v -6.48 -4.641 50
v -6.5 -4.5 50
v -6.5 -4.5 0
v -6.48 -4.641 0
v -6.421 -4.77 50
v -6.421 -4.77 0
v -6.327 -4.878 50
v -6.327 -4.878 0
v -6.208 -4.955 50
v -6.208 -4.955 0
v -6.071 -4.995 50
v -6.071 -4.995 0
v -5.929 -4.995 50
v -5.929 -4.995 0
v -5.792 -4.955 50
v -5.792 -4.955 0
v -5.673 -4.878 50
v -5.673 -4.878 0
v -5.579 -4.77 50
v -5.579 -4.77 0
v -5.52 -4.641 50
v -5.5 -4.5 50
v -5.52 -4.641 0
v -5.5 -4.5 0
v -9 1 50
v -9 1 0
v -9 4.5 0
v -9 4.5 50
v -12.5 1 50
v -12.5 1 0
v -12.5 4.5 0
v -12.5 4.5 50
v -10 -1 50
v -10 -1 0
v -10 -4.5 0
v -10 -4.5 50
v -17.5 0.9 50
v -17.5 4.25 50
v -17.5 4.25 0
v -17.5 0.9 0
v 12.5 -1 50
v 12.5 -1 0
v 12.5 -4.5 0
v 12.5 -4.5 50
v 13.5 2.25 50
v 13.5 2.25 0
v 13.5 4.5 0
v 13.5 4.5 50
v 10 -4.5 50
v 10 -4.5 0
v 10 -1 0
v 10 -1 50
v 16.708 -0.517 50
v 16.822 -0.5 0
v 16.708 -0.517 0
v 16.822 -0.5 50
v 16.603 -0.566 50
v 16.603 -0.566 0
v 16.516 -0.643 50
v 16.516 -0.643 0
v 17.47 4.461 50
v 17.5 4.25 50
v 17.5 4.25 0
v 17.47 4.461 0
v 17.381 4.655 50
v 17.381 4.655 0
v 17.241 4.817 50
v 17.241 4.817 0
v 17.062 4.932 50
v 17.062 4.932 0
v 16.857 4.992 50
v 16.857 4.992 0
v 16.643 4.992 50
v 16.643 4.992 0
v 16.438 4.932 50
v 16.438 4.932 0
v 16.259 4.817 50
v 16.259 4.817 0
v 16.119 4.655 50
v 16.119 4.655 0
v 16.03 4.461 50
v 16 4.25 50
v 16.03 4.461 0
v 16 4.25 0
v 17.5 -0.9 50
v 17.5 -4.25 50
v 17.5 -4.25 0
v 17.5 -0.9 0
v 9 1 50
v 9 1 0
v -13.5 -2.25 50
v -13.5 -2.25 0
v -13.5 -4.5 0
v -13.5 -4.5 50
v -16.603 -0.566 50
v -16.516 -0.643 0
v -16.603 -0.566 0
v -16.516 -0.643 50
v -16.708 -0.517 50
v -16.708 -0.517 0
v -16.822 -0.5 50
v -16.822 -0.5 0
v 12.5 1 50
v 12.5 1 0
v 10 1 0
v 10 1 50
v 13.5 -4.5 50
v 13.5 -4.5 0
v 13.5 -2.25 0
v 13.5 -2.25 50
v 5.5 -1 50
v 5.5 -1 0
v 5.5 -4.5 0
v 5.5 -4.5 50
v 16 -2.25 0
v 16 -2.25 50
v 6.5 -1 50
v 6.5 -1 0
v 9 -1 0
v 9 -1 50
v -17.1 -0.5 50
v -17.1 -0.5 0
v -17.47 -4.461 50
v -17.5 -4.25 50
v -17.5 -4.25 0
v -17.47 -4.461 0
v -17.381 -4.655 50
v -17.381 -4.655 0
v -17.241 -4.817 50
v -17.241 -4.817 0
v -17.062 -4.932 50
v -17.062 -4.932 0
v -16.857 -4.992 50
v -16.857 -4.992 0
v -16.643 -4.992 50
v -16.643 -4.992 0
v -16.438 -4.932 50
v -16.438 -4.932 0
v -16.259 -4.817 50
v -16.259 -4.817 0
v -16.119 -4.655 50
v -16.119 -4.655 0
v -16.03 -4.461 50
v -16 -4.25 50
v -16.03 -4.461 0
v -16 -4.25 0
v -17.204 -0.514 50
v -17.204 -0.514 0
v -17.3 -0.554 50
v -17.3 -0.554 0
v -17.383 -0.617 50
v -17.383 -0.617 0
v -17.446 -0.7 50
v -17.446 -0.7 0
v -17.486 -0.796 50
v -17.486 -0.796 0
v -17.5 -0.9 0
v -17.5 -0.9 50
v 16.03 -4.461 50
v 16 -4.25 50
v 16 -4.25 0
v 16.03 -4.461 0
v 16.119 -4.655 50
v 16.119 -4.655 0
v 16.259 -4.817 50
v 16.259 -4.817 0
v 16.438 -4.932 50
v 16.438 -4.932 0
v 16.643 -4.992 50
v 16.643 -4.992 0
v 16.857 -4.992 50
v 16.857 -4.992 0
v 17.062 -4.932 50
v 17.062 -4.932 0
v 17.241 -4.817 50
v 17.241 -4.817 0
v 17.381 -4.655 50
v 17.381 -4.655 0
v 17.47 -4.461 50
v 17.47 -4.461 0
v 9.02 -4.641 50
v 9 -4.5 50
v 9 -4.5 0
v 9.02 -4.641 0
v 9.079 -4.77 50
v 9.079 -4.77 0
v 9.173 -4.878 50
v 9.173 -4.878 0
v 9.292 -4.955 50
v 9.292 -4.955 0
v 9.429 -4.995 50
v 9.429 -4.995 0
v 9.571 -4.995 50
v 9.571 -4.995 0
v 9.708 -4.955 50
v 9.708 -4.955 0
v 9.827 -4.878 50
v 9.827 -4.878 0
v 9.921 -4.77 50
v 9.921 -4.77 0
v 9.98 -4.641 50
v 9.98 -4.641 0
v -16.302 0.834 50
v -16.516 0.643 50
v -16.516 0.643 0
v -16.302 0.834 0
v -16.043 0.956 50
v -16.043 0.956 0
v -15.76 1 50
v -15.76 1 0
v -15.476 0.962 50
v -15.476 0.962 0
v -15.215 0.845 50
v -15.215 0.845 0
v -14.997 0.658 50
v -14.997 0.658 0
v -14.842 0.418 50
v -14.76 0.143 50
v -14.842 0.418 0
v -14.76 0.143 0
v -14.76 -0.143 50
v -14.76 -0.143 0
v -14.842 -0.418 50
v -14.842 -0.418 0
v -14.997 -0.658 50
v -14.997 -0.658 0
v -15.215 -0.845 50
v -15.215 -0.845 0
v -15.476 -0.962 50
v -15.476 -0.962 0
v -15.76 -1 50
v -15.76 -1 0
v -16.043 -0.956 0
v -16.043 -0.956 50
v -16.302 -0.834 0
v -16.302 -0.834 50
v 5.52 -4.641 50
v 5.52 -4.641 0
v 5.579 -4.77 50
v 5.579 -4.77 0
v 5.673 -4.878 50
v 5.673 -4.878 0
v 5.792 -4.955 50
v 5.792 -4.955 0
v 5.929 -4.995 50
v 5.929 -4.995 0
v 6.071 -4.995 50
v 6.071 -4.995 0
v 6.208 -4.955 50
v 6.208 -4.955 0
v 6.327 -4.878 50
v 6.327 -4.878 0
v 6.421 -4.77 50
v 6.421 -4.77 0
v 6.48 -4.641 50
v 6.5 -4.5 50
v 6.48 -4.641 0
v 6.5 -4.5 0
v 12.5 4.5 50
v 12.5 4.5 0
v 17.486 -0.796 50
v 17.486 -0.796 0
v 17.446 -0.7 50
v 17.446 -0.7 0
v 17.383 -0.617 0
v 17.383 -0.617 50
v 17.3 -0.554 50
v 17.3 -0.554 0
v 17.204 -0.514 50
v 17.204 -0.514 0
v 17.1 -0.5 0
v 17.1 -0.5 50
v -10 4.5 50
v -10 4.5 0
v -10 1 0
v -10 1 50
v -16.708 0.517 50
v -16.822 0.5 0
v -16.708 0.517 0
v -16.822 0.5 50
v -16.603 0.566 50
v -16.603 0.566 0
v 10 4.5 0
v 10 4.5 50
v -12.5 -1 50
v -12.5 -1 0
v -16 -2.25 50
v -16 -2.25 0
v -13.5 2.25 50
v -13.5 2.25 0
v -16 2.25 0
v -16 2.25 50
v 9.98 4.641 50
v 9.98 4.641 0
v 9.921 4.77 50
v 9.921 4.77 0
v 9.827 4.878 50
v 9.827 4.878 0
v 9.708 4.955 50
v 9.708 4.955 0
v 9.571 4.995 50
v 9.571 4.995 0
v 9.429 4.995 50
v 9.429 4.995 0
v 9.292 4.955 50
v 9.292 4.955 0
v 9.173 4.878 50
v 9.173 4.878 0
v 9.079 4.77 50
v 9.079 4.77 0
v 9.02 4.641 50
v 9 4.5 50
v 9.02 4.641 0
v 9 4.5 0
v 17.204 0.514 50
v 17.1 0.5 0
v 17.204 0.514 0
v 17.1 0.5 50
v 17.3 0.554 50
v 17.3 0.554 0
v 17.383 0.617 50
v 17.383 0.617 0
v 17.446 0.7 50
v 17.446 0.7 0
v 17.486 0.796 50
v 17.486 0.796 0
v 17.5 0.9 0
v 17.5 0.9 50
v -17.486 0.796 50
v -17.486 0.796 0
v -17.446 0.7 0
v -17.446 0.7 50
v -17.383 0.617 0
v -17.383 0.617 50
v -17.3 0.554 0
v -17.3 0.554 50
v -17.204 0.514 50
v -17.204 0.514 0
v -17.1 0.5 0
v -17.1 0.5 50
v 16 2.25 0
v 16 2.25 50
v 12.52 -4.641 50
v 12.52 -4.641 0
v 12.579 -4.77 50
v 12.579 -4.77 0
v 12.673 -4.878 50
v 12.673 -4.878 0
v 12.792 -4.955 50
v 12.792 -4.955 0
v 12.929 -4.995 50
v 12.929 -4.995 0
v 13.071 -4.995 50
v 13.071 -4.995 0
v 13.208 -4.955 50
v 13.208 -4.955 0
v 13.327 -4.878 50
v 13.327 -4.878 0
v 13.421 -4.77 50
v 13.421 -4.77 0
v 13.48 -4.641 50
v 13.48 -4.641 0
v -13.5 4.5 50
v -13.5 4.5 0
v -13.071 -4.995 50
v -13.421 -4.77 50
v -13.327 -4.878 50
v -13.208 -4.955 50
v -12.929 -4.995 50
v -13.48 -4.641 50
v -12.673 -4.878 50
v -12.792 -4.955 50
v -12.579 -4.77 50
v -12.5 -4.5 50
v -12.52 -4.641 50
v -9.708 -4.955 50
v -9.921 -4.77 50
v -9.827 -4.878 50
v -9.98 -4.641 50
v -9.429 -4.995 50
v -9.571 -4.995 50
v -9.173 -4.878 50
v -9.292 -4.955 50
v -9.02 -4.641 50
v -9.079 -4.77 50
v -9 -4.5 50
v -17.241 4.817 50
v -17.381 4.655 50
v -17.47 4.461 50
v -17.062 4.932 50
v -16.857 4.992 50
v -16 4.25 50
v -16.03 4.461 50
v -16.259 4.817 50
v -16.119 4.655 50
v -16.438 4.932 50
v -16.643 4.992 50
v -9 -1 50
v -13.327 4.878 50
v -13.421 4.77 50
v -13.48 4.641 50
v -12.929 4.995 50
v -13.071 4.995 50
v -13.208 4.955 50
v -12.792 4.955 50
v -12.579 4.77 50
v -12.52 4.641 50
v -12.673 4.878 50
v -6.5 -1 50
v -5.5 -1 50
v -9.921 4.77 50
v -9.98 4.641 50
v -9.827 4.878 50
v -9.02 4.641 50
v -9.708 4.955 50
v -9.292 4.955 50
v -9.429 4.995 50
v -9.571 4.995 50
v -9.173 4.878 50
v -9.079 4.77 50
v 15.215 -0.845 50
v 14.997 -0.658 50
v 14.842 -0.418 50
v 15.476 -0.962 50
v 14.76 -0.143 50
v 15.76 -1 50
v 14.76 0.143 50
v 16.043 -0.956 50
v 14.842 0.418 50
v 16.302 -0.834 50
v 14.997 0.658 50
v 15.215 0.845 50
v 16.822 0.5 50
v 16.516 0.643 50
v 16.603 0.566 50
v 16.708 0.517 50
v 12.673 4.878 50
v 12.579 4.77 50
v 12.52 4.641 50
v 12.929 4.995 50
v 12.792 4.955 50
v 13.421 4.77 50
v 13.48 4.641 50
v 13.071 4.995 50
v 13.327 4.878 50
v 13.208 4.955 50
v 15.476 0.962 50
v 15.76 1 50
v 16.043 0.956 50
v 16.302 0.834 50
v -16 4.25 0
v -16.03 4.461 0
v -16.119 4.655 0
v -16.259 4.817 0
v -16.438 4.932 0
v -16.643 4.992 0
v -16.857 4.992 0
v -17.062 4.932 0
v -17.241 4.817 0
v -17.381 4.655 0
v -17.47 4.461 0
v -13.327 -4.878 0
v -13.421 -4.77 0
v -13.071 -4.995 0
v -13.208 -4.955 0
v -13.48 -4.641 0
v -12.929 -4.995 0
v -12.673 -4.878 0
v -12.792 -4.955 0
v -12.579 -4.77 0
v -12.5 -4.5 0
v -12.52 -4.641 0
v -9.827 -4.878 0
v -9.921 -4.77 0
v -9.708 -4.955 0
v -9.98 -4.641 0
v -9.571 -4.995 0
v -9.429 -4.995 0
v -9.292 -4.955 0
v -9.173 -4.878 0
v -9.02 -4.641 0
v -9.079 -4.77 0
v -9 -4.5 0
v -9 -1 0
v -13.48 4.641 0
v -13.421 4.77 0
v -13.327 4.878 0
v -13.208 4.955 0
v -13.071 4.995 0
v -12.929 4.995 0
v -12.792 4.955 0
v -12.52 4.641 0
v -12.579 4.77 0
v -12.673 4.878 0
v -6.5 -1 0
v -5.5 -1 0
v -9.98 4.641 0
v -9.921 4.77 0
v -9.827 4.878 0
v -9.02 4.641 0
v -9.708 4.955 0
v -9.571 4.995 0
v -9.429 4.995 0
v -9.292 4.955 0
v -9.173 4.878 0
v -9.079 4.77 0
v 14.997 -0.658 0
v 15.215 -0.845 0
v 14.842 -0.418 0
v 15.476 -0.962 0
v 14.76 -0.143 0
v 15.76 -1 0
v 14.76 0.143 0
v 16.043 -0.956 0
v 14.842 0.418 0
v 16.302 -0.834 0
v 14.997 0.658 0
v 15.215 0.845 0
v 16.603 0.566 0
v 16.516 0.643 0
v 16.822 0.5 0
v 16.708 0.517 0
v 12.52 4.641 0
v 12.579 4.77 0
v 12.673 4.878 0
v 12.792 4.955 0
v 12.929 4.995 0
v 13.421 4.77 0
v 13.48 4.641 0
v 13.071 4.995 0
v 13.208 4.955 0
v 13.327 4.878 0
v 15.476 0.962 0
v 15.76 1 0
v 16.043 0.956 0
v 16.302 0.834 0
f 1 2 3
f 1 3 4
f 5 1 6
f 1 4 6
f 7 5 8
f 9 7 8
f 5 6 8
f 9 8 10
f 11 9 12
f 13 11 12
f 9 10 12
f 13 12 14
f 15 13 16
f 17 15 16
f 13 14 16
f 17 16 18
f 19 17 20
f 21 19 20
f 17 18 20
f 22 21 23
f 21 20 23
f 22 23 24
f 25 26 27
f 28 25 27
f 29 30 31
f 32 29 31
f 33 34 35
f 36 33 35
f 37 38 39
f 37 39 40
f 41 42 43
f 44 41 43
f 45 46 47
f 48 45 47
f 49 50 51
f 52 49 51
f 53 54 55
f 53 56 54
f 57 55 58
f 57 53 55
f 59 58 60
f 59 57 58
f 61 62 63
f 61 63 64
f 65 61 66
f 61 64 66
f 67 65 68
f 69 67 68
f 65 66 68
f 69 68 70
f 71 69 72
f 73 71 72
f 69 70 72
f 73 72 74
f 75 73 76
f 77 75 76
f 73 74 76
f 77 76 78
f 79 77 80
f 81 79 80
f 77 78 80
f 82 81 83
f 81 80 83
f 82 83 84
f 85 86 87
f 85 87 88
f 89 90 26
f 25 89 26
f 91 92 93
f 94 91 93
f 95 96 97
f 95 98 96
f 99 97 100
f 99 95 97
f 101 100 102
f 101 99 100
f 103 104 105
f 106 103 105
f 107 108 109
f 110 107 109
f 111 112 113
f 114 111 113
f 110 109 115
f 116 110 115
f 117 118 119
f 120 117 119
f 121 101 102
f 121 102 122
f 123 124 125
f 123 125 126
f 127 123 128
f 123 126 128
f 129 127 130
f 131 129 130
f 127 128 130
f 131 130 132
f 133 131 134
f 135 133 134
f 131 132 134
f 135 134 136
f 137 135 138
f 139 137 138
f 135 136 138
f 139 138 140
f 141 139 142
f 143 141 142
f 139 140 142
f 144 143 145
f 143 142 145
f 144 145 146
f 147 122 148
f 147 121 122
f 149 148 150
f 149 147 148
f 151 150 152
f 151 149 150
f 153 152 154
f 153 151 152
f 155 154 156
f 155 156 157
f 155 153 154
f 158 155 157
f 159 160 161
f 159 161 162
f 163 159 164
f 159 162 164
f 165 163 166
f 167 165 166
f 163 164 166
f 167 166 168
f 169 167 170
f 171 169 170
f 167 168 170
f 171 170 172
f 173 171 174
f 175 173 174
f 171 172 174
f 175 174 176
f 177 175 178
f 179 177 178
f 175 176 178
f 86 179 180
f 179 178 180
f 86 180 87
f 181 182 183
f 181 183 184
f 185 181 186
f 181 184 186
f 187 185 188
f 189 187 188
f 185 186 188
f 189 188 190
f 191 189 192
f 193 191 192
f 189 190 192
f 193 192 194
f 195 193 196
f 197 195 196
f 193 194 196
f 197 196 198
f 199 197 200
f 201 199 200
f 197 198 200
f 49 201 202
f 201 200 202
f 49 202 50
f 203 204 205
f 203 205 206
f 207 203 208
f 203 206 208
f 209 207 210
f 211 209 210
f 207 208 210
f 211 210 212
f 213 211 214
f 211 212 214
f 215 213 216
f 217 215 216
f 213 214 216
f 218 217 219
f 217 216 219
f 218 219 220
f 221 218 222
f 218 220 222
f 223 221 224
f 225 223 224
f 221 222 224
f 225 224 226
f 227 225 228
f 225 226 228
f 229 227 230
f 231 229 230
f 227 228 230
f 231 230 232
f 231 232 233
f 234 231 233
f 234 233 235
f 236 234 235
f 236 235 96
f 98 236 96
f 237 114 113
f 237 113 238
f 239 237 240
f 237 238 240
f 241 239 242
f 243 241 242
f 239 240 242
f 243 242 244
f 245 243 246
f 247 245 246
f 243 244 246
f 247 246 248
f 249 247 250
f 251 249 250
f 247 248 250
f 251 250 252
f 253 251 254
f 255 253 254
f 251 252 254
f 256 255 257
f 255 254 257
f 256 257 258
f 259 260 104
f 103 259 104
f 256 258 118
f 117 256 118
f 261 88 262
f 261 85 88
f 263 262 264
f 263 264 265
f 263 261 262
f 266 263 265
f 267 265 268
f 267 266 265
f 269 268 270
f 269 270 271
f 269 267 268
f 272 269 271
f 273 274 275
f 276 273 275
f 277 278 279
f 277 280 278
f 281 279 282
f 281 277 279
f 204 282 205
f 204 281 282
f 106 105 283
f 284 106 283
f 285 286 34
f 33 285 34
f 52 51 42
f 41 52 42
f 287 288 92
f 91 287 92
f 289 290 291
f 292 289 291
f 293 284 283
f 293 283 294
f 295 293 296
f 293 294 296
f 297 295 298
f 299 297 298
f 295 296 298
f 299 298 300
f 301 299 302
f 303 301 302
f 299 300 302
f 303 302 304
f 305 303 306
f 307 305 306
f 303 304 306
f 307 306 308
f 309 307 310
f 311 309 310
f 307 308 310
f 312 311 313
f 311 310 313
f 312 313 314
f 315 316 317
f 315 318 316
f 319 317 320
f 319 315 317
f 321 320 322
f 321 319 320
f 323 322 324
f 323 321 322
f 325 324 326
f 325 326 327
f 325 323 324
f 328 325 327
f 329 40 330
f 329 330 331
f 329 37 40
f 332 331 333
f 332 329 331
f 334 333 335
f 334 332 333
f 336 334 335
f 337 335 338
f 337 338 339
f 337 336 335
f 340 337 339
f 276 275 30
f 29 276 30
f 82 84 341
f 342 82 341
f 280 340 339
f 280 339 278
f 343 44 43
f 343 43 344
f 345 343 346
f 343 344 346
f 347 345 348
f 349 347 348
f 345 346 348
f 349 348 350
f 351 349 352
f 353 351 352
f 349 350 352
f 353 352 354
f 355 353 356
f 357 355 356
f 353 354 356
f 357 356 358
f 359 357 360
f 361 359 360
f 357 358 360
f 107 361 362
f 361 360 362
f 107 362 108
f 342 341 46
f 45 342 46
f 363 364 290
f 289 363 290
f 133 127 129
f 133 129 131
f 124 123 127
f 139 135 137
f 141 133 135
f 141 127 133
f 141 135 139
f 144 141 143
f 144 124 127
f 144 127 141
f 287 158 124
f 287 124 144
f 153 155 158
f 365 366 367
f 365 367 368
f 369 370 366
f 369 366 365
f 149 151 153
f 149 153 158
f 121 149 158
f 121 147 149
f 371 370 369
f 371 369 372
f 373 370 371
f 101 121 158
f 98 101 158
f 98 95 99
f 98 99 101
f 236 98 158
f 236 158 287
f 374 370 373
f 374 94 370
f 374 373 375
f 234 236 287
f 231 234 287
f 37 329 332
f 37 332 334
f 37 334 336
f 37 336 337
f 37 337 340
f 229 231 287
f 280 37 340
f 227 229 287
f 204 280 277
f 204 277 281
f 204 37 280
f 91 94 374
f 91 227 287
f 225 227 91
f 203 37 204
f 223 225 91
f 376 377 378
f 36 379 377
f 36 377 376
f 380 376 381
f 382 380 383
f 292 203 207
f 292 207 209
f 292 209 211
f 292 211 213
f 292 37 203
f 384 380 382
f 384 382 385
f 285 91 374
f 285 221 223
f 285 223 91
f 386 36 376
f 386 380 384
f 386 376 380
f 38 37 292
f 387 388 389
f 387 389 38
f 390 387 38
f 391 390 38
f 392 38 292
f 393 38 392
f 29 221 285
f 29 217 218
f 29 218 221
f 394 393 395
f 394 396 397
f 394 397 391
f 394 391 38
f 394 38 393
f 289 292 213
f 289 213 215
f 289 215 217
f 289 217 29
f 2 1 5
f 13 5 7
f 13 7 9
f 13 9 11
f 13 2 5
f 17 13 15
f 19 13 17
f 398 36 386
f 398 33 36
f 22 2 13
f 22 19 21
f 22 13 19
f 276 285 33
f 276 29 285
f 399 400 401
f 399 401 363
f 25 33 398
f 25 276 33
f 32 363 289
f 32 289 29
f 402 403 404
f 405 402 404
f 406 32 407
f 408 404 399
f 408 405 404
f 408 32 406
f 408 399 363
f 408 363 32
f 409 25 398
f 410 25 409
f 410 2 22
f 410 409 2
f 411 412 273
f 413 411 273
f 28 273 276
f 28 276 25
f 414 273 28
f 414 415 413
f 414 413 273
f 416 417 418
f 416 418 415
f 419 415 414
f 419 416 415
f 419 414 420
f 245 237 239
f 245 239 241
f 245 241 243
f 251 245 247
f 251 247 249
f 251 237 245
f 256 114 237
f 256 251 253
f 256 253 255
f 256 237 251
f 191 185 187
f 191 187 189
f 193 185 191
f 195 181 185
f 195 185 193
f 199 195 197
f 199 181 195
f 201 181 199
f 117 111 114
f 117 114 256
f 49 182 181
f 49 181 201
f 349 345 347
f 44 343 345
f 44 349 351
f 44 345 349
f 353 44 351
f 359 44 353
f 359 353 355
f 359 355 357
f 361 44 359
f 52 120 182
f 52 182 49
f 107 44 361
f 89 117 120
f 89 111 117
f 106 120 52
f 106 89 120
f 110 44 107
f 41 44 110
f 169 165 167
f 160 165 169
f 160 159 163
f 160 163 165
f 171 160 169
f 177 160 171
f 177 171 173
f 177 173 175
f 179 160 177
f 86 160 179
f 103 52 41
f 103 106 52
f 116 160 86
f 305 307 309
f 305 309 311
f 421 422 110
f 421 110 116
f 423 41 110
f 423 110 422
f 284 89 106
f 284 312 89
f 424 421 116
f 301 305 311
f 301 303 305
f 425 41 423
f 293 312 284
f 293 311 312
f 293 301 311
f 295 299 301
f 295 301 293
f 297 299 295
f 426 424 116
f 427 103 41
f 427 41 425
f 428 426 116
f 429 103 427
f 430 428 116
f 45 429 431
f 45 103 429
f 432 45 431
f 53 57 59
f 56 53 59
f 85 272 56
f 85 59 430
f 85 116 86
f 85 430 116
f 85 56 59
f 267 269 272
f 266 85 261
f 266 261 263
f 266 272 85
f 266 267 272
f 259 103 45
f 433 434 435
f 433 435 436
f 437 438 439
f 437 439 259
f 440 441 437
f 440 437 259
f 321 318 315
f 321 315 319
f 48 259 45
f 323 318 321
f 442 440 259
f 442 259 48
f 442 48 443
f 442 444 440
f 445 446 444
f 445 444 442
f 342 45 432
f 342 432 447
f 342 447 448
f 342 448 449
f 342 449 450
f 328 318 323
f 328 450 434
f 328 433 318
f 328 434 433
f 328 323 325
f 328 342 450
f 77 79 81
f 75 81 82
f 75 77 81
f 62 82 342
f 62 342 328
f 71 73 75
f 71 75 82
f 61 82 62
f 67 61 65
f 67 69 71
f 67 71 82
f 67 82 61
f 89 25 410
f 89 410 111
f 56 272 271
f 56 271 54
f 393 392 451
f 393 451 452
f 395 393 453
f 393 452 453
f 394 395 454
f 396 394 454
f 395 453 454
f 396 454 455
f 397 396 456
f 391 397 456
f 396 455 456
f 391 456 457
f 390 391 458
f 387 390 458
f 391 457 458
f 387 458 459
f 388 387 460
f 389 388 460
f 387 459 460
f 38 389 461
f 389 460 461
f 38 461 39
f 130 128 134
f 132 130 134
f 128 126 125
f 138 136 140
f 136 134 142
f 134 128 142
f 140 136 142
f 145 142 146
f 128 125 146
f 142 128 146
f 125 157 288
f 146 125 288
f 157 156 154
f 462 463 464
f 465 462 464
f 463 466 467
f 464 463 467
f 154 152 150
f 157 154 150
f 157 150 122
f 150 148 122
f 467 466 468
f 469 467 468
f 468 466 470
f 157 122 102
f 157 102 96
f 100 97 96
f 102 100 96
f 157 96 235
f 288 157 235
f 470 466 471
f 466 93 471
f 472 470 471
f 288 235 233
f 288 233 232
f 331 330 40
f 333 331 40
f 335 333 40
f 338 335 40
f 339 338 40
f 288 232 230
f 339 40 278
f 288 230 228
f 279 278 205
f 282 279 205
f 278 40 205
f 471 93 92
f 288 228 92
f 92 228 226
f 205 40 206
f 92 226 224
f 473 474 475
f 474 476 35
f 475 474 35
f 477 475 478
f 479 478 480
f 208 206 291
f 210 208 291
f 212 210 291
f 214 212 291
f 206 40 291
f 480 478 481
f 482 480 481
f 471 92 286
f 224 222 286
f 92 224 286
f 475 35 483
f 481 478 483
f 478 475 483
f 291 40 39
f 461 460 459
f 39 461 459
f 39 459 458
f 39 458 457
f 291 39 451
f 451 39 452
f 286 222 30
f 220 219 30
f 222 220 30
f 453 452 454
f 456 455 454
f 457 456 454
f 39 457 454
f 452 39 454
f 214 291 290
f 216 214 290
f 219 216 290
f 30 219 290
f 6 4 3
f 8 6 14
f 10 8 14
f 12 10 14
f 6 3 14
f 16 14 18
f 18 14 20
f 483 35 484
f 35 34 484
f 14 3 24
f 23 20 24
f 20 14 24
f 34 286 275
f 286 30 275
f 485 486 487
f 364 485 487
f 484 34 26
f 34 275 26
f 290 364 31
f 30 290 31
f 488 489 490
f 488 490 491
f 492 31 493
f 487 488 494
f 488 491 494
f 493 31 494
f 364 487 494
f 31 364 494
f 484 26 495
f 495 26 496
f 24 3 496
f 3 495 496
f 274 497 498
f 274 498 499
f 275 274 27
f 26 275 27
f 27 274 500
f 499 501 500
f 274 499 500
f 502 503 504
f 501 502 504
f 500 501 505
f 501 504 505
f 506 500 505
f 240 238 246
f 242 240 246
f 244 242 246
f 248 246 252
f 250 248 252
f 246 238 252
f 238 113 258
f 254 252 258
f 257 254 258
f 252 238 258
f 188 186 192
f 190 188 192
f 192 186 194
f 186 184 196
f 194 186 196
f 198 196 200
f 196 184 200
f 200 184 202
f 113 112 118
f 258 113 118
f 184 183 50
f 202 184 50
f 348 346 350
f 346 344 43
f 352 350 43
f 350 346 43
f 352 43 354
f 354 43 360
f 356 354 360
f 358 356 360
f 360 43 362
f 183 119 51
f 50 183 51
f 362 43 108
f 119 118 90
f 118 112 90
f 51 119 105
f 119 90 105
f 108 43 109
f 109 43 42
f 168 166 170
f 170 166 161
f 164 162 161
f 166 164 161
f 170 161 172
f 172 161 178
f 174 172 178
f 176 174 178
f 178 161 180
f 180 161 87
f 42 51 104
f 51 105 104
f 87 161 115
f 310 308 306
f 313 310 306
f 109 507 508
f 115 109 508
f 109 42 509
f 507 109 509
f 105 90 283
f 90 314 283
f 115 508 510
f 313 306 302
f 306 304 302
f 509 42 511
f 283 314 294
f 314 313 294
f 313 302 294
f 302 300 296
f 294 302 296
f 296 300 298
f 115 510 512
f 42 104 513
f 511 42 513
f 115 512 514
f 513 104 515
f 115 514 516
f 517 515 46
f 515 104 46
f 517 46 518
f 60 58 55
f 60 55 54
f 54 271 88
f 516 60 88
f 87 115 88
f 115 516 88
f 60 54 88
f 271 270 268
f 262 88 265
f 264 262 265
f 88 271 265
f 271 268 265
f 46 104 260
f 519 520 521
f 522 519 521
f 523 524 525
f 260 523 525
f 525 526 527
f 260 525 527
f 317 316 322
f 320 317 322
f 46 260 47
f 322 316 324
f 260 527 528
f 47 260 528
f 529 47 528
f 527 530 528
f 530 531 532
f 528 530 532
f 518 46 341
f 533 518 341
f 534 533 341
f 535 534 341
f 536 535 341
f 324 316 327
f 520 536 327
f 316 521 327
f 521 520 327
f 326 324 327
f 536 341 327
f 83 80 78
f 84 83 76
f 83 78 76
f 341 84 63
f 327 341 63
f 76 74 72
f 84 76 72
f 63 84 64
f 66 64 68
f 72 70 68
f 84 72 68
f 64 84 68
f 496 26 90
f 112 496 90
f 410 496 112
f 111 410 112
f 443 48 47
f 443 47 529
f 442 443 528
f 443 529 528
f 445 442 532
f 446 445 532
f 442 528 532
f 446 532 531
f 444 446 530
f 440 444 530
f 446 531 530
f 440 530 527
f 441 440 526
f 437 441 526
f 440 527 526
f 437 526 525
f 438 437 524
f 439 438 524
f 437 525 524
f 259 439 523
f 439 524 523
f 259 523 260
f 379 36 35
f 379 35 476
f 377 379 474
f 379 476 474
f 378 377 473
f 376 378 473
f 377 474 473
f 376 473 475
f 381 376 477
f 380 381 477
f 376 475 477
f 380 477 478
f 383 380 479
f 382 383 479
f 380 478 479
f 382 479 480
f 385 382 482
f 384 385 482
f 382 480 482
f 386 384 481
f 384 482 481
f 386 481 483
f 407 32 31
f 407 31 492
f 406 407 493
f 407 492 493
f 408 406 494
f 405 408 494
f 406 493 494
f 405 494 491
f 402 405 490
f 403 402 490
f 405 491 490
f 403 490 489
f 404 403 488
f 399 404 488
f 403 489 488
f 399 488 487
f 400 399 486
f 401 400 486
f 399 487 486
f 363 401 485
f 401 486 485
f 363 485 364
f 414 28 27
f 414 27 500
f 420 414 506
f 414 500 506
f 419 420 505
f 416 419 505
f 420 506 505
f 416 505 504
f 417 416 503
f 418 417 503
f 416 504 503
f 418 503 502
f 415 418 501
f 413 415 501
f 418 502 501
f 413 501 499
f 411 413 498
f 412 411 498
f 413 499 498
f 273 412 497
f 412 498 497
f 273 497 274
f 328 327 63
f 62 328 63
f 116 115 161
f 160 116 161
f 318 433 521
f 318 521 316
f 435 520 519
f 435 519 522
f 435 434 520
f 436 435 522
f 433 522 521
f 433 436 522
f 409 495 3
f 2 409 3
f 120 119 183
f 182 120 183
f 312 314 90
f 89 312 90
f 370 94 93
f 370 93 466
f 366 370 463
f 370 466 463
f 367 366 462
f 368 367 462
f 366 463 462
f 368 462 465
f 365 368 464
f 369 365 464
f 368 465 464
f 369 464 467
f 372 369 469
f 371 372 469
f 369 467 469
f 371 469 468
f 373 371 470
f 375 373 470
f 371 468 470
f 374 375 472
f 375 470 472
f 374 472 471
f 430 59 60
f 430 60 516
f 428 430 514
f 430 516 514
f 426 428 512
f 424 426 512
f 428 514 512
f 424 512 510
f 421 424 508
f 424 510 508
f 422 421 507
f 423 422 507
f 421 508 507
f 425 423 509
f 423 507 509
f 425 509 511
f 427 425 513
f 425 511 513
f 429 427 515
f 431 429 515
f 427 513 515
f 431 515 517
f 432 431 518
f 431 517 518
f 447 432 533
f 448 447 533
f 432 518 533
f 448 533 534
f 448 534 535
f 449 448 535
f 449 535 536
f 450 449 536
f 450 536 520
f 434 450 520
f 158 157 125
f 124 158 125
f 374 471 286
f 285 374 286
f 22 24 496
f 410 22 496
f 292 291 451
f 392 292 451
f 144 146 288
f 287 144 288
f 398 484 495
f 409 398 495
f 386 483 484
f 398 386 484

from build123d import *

# Parameters (mm, degrees)
EXTRUDE_1_DEPTH = 50
FILLET_1_R      = 0.4


with BuildPart() as part:
    # Эскиз1 → Бобышка-Вытянуть1 (new body)
    with BuildSketch(Plane.XY):
        with BuildLine():
            Line((17.5, -4.25), (17.5, -0.5))
            Line((17.5, -0.5), (16.616025404, -0.5))
            ThreePointArc((16.616025404, -0.5), (14.75, 0), (16.616025404, 0.5))
            Line((16.616025404, 0.5), (17.5, 0.5))
            Line((17.5, 0.5), (17.5, 4.25))
            ThreePointArc((17.5, 4.25), (16.75, 5), (16, 4.25))
            Line((16, 4.25), (16, 2.25))
            Line((16, 2.25), (13.5, 2.25))
            Line((13.5, 2.25), (13.5, 4.5))
            ThreePointArc((13.5, 4.5), (13, 5), (12.5, 4.5))
            Line((12.5, 4.5), (12.5, 1))
            Line((12.5, 1), (10, 1))
            Line((10, 1), (10, 4.5))
            ThreePointArc((10, 4.5), (9.5, 5), (9, 4.5))
            Line((9, 4.5), (9, 1))
            Line((9, 1), (-9, 1))
            Line((-9, 1), (-9, 4.5))
            ThreePointArc((-9, 4.5), (-9.5, 5), (-10, 4.5))
            Line((-10, 4.5), (-10, 1))
            Line((-10, 1), (-12.5, 1))
            Line((-12.5, 1), (-12.5, 4.5))
            ThreePointArc((-12.5, 4.5), (-13, 5), (-13.5, 4.5))
            Line((-13.5, 4.5), (-13.5, 2.25))
            Line((-13.5, 2.25), (-16, 2.25))
            Line((-16, 2.25), (-16, 4.25))
            ThreePointArc((-16, 4.25), (-16.75, 5), (-17.5, 4.25))
            Line((-17.5, 4.25), (-17.5, 0.5))
            Line((-17.5, 0.5), (-16.616025404, 0.5))
            ThreePointArc((-16.616025404, 0.5), (-14.75, 0), (-16.616025404, -0.5))
            Line((-16.616025404, -0.5), (-17.5, -0.5))
            Line((-17.5, -0.5), (-17.5, -4.25))
            ThreePointArc((-17.5, -4.25), (-16.75, -5), (-16, -4.25))
            Line((-16, -4.25), (-16, -2.25))
            Line((-16, -2.25), (-13.5, -2.25))
            Line((-13.5, -2.25), (-13.5, -4.5))
            ThreePointArc((-13.5, -4.5), (-13, -5), (-12.5, -4.5))
            Line((-12.5, -4.5), (-12.5, -1))
            Line((-12.5, -1), (-10, -1))
            Line((-10, -1), (-10, -4.5))
            ThreePointArc((-10, -4.5), (-9.5, -5), (-9, -4.5))
            Line((-9, -4.5), (-9, -1))
            Line((-9, -1), (-6.5, -1))
            Line((-6.5, -1), (-6.5, -4.5))
            ThreePointArc((-6.5, -4.5), (-6, -5), (-5.5, -4.5))
            Line((-5.5, -4.5), (-5.5, -1))
            Line((-5.5, -1), (5.5, -1))
            Line((5.5, -1), (5.5, -4.5))
            ThreePointArc((5.5, -4.5), (6, -5), (6.5, -4.5))
            Line((6.5, -4.5), (6.5, -1))
            Line((6.5, -1), (9, -1))
            Line((9, -1), (9, -4.5))
            ThreePointArc((9, -4.5), (9.5, -5), (10, -4.5))
            Line((10, -4.5), (10, -1))
            Line((10, -1), (12.5, -1))
            Line((12.5, -1), (12.5, -4.5))
            ThreePointArc((12.5, -4.5), (13, -5), (13.5, -4.5))
            Line((13.5, -4.5), (13.5, -2.25))
            Line((13.5, -2.25), (16, -2.25))
            Line((16, -2.25), (16, -4.25))
            ThreePointArc((16, -4.25), (16.75, -5), (17.5, -4.25))
        make_face()
    extrude(amount=EXTRUDE_1_DEPTH)

    # Скругление1
    fillet_1_edges = [part.edges().sort_by_distance(p)[0] for p in [
        (-17.5, -0.5, 25),
        (-16.616025404, -0.5, 25),
        (-16.616025404, 0.5, 25),
        (-17.5, 0.5, 25),
        (17.5, 0.5, 25),
        (16.616025404, 0.5, 25),
        (16.616025404, -0.5, 25),
        (17.5, -0.5, 25),
    ]]
    fillet(fillet_1_edges, radius=FILLET_1_R)


solid = part.part
